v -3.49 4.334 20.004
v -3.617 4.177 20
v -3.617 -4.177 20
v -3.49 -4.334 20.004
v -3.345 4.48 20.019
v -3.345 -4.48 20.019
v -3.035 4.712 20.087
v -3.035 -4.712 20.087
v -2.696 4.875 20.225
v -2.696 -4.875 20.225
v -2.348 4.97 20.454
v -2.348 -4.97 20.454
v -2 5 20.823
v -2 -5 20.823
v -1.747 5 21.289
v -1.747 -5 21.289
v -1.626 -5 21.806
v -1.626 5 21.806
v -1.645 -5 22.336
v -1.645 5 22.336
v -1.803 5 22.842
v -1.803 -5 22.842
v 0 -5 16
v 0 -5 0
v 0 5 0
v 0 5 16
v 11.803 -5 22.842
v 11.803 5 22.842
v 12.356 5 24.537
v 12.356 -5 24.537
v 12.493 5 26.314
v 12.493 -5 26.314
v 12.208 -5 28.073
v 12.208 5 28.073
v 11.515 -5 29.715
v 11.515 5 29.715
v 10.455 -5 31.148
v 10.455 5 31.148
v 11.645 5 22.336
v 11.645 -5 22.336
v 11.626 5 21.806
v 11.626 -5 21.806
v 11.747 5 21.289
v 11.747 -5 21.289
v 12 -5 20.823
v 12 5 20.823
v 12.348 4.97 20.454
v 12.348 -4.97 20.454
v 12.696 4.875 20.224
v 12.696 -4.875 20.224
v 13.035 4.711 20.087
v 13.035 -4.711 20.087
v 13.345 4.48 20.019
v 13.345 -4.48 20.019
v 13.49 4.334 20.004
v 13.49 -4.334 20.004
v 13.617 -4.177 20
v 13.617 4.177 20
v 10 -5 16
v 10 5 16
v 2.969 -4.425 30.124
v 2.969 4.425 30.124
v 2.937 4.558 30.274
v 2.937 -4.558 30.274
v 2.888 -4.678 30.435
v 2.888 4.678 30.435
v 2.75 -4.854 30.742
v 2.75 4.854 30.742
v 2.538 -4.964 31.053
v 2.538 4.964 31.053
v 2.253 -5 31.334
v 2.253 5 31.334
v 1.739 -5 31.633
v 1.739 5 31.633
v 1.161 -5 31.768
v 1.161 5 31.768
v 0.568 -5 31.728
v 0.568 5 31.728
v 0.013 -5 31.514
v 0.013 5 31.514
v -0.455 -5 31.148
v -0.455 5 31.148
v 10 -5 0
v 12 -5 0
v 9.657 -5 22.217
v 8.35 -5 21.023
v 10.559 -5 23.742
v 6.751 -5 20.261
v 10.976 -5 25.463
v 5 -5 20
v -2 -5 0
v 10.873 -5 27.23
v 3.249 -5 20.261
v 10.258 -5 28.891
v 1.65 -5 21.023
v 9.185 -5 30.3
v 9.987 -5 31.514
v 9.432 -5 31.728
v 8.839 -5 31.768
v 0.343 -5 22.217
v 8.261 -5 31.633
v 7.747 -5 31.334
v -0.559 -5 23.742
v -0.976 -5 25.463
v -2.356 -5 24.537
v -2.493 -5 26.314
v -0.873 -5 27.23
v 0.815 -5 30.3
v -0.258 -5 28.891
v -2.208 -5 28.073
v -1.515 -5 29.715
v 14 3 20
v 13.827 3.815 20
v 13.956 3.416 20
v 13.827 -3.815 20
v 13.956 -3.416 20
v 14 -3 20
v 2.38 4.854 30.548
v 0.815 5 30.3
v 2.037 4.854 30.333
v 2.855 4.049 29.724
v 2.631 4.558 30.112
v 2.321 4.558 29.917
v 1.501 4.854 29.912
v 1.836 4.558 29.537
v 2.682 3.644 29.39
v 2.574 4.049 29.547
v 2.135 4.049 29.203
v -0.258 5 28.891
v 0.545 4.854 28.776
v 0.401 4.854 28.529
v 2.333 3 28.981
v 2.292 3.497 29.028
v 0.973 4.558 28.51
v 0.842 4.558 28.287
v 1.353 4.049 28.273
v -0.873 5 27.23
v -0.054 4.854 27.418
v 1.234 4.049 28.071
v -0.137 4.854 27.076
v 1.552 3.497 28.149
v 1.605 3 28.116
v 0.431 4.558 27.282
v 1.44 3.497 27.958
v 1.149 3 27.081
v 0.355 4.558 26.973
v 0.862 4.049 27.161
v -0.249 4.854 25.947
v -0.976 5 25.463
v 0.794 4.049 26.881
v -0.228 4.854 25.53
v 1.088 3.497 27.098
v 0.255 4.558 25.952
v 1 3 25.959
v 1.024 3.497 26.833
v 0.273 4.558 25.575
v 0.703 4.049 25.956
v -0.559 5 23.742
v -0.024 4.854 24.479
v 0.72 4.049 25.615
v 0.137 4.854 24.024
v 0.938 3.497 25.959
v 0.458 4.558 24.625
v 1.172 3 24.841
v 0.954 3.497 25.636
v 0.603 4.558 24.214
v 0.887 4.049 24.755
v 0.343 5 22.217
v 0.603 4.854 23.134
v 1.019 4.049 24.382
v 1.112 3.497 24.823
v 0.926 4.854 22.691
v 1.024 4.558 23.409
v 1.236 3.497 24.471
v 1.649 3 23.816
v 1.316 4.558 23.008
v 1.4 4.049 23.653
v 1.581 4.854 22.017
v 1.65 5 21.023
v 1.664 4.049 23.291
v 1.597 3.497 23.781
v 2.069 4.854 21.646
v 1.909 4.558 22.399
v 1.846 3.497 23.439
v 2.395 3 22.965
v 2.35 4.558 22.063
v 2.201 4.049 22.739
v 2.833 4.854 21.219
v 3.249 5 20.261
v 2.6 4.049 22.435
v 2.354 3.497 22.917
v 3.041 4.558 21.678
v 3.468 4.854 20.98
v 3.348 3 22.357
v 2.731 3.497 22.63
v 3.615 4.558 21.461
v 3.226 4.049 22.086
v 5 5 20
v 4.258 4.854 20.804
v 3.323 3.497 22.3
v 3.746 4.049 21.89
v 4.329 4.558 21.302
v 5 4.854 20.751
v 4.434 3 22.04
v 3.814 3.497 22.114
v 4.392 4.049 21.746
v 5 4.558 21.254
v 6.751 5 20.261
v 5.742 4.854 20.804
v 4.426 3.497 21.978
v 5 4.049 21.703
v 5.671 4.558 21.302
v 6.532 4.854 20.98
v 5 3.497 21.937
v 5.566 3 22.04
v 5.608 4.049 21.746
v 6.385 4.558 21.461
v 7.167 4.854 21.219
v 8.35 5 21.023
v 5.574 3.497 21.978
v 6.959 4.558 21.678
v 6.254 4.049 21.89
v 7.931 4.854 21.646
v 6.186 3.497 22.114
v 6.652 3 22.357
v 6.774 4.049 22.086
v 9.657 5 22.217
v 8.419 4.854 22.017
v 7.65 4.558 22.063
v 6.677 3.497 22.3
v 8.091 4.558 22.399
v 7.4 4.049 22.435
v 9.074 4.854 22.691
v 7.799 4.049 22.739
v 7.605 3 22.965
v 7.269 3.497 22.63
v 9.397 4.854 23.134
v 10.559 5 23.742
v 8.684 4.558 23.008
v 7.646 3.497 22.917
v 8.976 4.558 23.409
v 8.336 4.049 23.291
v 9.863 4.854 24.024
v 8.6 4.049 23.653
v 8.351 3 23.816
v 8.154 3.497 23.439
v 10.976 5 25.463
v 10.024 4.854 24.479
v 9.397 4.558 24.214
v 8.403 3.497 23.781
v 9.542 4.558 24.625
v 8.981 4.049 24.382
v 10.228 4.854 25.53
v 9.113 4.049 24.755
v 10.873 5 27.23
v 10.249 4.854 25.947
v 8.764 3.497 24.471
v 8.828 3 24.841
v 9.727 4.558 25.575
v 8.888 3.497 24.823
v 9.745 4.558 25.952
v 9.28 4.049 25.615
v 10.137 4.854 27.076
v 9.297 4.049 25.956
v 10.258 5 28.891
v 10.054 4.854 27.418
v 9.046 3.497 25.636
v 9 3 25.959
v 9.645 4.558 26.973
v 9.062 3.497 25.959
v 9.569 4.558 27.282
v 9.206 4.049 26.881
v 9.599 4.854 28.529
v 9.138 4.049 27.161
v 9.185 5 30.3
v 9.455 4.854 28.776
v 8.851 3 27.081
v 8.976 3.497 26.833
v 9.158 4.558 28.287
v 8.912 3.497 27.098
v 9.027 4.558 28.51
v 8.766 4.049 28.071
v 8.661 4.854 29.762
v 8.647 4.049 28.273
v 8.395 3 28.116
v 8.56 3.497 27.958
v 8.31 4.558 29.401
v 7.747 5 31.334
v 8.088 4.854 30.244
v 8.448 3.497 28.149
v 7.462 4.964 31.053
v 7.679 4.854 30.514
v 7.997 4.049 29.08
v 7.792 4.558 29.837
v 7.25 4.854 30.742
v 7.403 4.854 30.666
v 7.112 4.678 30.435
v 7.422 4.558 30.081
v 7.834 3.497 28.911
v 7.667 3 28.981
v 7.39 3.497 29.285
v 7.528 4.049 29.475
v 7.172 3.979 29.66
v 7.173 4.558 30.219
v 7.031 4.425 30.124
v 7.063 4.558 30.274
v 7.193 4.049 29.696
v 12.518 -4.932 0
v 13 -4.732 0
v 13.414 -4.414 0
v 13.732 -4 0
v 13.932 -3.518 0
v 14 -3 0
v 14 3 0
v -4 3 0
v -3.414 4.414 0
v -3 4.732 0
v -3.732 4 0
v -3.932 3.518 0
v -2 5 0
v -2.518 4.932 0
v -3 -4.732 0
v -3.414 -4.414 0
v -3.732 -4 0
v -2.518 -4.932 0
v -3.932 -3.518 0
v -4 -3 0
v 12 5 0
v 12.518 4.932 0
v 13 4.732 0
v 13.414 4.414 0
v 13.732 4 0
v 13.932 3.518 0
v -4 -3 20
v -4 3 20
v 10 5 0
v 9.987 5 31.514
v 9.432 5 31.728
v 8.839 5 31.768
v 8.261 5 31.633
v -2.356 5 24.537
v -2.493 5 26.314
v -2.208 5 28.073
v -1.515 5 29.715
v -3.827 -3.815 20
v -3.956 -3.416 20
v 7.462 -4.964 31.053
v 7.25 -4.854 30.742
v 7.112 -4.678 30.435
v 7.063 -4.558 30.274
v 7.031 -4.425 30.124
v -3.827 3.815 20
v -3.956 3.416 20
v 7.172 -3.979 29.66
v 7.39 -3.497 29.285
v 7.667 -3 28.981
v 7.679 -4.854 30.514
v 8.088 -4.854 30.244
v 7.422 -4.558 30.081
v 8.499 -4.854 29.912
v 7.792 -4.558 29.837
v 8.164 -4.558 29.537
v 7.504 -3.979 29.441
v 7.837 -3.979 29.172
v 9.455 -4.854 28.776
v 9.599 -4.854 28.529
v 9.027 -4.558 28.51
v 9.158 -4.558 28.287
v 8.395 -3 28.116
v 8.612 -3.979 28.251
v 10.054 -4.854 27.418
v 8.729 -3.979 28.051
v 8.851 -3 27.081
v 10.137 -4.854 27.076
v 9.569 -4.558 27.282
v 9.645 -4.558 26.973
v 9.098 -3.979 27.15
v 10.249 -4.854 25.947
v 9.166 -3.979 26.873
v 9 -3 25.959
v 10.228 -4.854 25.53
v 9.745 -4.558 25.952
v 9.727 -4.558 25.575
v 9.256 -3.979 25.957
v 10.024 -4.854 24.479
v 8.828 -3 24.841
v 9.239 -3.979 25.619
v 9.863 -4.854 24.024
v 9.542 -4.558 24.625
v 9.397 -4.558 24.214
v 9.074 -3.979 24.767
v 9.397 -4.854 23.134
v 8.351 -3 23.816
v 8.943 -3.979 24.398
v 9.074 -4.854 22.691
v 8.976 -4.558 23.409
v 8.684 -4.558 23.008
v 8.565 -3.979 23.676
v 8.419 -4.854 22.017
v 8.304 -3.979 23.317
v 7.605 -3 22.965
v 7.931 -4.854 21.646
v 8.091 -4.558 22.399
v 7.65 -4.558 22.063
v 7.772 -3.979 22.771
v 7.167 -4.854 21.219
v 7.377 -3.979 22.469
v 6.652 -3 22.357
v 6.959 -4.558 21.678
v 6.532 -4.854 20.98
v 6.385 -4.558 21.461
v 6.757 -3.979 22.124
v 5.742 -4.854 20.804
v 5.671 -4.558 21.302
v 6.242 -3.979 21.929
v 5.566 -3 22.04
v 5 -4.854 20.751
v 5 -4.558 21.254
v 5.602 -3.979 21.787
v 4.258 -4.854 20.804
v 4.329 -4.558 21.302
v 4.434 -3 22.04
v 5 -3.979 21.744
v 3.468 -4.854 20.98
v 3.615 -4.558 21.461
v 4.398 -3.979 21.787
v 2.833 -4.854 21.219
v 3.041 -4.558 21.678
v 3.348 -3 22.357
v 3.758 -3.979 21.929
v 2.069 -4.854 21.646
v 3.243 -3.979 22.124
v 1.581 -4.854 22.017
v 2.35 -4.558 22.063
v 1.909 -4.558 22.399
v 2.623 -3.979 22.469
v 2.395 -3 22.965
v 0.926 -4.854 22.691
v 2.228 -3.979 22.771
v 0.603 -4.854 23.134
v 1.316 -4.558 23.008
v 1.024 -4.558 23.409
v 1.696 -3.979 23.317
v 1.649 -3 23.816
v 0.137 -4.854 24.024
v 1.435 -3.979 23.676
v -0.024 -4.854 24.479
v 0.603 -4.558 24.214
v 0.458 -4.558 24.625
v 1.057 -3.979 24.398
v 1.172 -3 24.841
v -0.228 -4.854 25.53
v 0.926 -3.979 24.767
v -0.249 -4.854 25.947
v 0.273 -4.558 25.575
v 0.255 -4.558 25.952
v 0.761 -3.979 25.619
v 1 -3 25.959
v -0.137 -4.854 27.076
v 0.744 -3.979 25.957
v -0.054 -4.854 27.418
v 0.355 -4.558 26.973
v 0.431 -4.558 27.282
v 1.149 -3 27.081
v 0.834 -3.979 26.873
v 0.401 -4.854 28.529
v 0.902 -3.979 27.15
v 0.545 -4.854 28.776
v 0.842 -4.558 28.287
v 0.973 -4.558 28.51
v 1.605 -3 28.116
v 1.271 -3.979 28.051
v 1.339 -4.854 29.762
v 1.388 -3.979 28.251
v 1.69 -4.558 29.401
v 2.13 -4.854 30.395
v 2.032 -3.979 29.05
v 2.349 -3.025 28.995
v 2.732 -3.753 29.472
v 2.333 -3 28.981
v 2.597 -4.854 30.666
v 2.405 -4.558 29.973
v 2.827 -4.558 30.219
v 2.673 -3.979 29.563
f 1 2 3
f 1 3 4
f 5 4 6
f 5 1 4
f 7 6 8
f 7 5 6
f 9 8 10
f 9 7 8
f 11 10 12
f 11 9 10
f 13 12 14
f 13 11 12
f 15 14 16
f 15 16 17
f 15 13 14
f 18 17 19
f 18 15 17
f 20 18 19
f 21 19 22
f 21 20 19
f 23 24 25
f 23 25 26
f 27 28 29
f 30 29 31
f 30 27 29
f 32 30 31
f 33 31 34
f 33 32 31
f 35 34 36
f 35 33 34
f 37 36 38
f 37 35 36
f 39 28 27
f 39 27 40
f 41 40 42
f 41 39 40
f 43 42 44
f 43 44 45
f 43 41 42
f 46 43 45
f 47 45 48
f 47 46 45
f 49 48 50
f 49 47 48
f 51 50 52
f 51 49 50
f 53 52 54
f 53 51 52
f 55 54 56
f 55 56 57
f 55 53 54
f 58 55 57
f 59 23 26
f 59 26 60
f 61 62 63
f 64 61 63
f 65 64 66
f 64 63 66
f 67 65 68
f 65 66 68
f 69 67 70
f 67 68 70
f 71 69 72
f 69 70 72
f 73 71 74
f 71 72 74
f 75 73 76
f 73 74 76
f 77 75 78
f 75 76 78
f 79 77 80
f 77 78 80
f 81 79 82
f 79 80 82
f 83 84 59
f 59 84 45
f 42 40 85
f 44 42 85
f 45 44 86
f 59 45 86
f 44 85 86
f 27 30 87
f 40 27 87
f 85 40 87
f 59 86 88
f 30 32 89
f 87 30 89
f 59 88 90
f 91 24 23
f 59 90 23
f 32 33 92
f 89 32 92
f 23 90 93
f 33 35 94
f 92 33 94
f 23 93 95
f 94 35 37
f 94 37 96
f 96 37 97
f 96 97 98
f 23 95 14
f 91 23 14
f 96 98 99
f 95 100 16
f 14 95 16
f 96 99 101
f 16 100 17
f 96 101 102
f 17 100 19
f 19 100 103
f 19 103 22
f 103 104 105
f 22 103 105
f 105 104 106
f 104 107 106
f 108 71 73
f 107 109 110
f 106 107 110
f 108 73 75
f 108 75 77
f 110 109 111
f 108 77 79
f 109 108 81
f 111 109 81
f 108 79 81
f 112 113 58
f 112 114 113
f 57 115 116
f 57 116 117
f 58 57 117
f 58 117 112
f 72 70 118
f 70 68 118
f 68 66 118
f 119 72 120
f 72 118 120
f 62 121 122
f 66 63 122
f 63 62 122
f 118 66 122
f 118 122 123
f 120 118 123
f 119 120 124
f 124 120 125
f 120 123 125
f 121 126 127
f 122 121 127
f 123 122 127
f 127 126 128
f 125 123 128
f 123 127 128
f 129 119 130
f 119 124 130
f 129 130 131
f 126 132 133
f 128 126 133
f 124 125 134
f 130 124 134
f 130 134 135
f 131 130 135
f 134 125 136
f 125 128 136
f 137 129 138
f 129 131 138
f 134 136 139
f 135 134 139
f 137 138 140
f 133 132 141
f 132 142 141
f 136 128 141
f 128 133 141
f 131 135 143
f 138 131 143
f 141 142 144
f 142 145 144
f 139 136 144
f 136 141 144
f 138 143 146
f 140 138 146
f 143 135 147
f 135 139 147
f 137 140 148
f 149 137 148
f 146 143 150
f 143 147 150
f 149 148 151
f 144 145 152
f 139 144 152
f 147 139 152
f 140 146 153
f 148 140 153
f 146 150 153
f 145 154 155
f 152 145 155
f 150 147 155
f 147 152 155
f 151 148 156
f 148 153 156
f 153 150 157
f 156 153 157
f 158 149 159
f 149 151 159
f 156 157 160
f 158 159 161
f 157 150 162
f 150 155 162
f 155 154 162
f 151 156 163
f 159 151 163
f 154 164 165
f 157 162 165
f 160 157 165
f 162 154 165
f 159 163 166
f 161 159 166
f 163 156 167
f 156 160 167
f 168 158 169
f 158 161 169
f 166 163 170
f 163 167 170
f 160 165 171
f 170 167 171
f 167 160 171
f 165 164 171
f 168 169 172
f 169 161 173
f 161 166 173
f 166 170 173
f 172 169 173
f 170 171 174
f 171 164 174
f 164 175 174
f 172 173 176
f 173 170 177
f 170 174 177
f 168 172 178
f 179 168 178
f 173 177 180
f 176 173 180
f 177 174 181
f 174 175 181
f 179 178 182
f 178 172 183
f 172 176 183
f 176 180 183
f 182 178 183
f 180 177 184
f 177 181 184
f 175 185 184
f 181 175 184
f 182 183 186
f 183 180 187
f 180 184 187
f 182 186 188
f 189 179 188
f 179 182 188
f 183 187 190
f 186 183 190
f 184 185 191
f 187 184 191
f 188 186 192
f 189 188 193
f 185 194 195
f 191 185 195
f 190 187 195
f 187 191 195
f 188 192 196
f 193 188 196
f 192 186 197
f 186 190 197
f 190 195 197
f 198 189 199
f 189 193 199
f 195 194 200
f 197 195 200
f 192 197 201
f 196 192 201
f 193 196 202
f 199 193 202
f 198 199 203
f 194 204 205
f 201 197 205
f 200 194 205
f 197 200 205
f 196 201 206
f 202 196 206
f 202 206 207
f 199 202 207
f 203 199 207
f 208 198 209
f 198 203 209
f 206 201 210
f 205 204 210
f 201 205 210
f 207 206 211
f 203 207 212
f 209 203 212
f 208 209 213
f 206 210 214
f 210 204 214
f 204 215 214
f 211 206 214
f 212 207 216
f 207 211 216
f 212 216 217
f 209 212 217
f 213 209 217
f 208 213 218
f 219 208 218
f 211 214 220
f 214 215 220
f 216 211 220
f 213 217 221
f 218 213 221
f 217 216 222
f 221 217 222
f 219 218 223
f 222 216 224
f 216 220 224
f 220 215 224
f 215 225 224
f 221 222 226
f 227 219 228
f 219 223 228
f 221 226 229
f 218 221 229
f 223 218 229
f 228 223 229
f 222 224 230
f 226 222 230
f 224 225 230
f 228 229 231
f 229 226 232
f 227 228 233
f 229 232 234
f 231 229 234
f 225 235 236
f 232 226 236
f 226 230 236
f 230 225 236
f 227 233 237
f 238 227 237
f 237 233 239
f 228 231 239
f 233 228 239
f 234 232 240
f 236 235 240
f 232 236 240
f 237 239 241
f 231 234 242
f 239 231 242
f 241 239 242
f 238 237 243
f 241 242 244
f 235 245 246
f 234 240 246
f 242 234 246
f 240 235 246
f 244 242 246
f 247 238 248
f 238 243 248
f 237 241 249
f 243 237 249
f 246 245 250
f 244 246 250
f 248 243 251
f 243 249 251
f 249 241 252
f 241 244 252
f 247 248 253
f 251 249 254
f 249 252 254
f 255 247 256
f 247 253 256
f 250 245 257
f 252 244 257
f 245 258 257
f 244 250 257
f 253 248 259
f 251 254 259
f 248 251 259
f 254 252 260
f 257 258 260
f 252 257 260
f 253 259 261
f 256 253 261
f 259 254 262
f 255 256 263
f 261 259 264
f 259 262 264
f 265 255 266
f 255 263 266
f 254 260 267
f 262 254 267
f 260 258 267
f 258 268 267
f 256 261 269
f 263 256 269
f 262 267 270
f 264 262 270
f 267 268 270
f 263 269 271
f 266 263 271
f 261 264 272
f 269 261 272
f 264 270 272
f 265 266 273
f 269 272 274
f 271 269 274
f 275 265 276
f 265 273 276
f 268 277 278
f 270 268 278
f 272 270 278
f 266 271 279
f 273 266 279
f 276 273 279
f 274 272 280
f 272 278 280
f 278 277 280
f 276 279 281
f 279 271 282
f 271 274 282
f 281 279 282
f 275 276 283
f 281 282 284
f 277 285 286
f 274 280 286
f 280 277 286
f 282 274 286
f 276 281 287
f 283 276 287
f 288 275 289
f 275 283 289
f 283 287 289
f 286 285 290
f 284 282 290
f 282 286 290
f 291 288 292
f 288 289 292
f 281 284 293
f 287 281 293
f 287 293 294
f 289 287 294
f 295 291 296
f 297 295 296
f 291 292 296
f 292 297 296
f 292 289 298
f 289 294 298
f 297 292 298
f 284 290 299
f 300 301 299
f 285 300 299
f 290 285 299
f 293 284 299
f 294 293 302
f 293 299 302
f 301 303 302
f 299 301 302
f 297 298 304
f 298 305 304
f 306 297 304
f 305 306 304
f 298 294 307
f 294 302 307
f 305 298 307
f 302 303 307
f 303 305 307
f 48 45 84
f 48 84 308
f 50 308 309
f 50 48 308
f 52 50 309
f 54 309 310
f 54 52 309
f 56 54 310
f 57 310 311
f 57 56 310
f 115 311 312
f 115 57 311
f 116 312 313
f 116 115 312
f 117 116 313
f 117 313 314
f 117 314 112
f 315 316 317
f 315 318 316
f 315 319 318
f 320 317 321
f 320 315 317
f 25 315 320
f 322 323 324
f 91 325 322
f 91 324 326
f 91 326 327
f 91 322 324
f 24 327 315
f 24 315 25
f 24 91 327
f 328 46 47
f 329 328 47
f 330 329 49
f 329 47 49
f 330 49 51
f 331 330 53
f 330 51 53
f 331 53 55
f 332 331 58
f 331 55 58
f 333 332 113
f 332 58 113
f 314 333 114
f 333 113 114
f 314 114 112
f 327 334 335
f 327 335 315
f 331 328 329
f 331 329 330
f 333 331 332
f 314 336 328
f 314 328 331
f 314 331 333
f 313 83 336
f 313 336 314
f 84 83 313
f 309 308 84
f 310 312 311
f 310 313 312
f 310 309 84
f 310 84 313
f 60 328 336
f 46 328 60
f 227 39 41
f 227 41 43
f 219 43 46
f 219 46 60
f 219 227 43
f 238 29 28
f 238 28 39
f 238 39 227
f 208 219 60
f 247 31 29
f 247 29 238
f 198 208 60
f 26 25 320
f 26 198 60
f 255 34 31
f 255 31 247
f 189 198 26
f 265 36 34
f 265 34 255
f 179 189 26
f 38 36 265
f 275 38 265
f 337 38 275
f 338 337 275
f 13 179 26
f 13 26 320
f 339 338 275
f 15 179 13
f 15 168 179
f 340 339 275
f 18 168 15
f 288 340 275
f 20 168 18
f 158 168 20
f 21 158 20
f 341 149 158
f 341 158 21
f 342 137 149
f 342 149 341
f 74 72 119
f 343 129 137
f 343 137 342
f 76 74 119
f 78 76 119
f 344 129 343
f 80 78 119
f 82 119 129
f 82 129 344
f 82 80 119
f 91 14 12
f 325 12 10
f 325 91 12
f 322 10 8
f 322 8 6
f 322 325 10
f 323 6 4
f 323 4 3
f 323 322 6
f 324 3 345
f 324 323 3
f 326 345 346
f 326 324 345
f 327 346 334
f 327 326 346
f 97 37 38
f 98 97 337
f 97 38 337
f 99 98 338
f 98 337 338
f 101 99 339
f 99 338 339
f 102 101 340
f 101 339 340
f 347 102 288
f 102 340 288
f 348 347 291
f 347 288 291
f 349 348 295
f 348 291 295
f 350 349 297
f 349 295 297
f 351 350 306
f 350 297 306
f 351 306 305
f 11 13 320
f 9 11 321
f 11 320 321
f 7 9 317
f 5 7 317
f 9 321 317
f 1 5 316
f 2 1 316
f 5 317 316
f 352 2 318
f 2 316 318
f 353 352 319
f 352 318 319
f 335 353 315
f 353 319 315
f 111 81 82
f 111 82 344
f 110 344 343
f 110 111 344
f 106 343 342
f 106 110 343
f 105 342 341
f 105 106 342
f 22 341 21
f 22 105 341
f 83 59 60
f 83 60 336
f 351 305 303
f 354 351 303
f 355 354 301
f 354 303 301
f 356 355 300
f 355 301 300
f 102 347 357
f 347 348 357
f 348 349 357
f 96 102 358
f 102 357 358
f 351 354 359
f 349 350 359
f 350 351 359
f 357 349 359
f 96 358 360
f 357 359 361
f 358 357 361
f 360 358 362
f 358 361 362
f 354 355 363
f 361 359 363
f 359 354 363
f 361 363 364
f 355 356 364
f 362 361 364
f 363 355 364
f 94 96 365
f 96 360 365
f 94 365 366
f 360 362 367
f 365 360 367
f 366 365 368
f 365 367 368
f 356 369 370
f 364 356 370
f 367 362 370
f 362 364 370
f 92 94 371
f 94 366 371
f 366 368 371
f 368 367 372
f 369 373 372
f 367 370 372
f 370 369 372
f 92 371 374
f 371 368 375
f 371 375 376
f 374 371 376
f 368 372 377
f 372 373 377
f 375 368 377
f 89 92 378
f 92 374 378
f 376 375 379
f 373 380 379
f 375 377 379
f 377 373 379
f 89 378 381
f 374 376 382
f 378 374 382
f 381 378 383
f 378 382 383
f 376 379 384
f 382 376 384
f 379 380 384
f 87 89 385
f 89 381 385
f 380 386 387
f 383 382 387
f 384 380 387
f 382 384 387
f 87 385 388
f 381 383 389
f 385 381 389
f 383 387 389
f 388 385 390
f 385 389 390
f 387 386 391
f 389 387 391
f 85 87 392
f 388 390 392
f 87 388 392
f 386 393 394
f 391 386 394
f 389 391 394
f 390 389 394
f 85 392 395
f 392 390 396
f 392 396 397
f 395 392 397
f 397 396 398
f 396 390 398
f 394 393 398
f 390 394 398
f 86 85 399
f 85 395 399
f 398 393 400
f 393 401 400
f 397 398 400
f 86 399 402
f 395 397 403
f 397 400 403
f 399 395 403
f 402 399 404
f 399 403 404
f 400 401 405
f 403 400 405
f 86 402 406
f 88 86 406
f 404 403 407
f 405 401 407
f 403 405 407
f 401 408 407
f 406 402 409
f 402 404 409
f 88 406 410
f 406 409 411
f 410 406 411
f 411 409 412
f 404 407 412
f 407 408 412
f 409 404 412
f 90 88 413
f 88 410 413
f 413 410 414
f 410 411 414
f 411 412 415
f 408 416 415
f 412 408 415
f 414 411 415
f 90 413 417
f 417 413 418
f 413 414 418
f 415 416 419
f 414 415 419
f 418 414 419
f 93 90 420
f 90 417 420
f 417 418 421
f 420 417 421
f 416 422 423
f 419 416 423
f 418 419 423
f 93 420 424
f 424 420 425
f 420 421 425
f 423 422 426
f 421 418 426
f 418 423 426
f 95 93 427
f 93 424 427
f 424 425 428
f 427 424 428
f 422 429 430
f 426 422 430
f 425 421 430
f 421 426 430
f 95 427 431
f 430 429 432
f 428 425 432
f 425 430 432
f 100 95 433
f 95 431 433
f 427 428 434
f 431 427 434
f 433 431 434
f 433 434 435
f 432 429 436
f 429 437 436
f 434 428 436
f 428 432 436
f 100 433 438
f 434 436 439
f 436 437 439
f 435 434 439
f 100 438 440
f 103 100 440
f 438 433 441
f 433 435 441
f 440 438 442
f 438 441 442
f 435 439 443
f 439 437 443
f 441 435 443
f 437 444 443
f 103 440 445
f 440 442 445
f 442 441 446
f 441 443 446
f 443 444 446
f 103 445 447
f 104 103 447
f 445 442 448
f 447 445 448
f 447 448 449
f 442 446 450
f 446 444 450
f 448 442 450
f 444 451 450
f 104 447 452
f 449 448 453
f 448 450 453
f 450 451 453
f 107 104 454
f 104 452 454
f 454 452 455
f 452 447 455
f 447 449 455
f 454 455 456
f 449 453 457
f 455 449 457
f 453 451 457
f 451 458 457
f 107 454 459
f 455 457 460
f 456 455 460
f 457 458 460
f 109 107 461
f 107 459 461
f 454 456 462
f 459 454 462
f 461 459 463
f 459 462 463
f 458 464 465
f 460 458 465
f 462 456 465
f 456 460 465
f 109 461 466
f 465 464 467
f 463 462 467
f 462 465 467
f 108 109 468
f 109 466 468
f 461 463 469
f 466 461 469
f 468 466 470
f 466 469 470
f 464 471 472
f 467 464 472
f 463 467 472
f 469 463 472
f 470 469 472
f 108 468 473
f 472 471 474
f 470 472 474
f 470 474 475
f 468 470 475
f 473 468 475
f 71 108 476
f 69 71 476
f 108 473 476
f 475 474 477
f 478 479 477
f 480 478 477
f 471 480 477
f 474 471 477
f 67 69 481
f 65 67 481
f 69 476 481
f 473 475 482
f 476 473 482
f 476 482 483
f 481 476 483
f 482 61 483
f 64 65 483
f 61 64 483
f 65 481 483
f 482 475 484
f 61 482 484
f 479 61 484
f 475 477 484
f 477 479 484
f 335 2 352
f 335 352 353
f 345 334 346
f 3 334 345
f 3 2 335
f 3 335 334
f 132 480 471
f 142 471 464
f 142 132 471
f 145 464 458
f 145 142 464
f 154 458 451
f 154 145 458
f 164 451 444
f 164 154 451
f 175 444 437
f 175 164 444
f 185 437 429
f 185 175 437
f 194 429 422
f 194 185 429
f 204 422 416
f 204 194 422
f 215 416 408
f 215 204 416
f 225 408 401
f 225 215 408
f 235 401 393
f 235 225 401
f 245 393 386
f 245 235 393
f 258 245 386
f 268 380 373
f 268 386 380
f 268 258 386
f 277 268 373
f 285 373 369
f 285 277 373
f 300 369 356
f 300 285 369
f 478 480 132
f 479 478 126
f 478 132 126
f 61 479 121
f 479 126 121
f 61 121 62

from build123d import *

# Parameters (mm, degrees)
F1_DEPTH    = 5
F2_R        = 7.5
F2_R_2      = 4
F3_DEPTH    = 5
F4_W        = 4
F4_H        = 10
F5_DEPTH    = 5.7
F6_T1_DEPTH = 10
F6_T3_DEPTH = 30.1640895286
F6_T5_DEPTH = 15.0401716993
F7_R        = 2
F8_T2_ANGLE = 359.64
F8_T4_ANGLE = 359.64


# Not quite as in the source:
# - a fillet or chamfer that OpenCascade refuses, or shapes differently, is made with other operations: its cross-section is extruded or revolved along the edge and cut away or added


with BuildPart() as f1:
    # F0 (on Front) → F1 (new body, symmetric)
    with BuildSketch(Plane.XZ):
        Polygon((-4, 0), (0, 0), (0, 16), (10, 16), (10, 0), (14, 0), (14, 20), (-4, 20), align=None)
    extrude(amount=F1_DEPTH, both=True)

    # F2 (on Front) → F3 (join, symmetric)
    with BuildSketch(Plane.XZ):
        with Locations((5, 26)):
            Circle(F2_R)
        with Locations((5, 26)):
            Circle(F2_R_2, mode=Mode.SUBTRACT)
    extrude(amount=F3_DEPTH, both=True)

    # F4 (on Front) → F5 (cut, symmetric)
    with BuildSketch(Plane.XZ):
        with Locations((5, 31.8401088891)):
            Rectangle(F4_W, F4_H)
    extrude(amount=F5_DEPTH, both=True, mode=Mode.SUBTRACT)

    # F6: fillet of radius 2 on 6 edges, made by hand

    # F6_s2 → F6_t1 (join)
    with BuildSketch(Plane.XZ.offset(-5)):
        with BuildLine():
            ThreePointArc((-3.6168439698, 20), (-1.930989509, 20.9239448263), (-1.8027715551, 22.8421052632))
            ThreePointArc((-1.8027715551, 22.8421052632), (-0.8273108539, 21.2785120765), (0.5, 20))
            Line((0.5, 20), (-3.6168439698, 20))
        make_face()
        with BuildLine():
            ThreePointArc((11.8027715551, 22.8421052632), (11.930989509, 20.9239448263), (13.6168439698, 20))
            Line((13.6168439698, 20), (9.5, 20))
            ThreePointArc((9.5, 20), (10.8273108539, 21.2785120765), (11.8027715551, 22.8421052632))
        make_face()
    extrude(amount=F6_T1_DEPTH)

    # F6_s4 → F6_t3 (cut)
    with BuildSketch(Plane.XZ.offset(-15.0820447643)):
        with BuildLine():
            ThreePointArc((10.4545454545, 31.1476143877), (8.2614510541, 31.6335579722), (7, 29.7749172176))
            Line((7, 29.7749172176), (7, 33.2284161474))
            ThreePointArc((7, 33.2284161474), (8.869753994, 32.4245625552), (10.4545454545, 31.1476143877))
        make_face()
        with BuildLine():
            ThreePointArc((3, 29.7749172176), (1.7385489459, 31.6335579722), (-0.4545454545, 31.1476143877))
            ThreePointArc((-0.4545454545, 31.1476143877), (1.130246006, 32.4245625552), (3, 33.2284161474))
            Line((3, 33.2284161474), (3, 29.7749172176))
        make_face()
    extrude(amount=F6_T3_DEPTH, mode=Mode.SUBTRACT)

    # F6_s6 → F6_t5 (cut)
    with BuildSketch(Plane.XZ.offset(-7.5200858497)):
        with BuildLine():
            ThreePointArc((7, 30.472135955), (7.1742581416, 29.6556393741), (7.6666666667, 28.98142397))
            ThreePointArc((7.6666666667, 28.98142397), (7.3457810792, 29.2399554207), (7, 29.4641016151))
            Line((7, 29.4641016151), (7, 30.472135955))
        make_face()
        with BuildLine():
            ThreePointArc((2.3333333333, 28.98142397), (2.8257418584, 29.6556393741), (3, 30.472135955))
            Line((3, 30.472135955), (3, 29.4641016151))
            ThreePointArc((3, 29.4641016151), (2.6542189208, 29.2399554207), (2.3333333333, 28.98142397))
        make_face()
    extrude(amount=F6_T5_DEPTH, mode=Mode.SUBTRACT)

    # F7
    f7_edges = [f1.edges().sort_by_distance(p)[0] for p in [
        (-4, -5, 10),
        (14, -5, 10),
        (14, 5, 10),
        (-4, 5, 10),
    ]]
    fillet(f7_edges, radius=F7_R)

    # F8: fillet of radius 2 on 2 edges, made by hand

    # F8_s1 → F8_t2 (revolve, cut)
    with BuildSketch(Plane(origin=(4.9182697806, 0, -0.015451251), x_dir=(0, 1, 0), z_dir=(-0.9999950652, 0, 0.0031415875))):
        with BuildLine():
            ThreePointArc((-5, -32.0155796327), (-4.4142135624, -30.6013660703), (-3, -30.0155796327))
            Line((-3, -30.0155796327), (-5, -30.0155796327))
            Line((-5, -30.0155796327), (-5, -32.0155796327))
        make_face()
    revolve(axis=Axis((5, -5, 26), (0, 1, 0)), revolution_arc=F8_T2_ANGLE, mode=Mode.SUBTRACT)

    # F8_s3 → F8_t4 (revolve, cut)
    with BuildSketch(Plane(origin=(5.0816315237, 0, 0.0159644688), x_dir=(0, 1, 0), z_dir=(0.9999950652, 0, 0.0031415875))):
        with BuildLine():
            ThreePointArc((5, 31.9841637578), (4.4142135624, 30.5699501954), (3, 29.9841637578))
            Line((3, 29.9841637578), (5, 29.9841637578))
            Line((5, 29.9841637578), (5, 31.9841637578))
        make_face()
    revolve(axis=Axis((5, 5, 26), (0, -1, 0)), revolution_arc=F8_T4_ANGLE, mode=Mode.SUBTRACT)


solid = f1.part
